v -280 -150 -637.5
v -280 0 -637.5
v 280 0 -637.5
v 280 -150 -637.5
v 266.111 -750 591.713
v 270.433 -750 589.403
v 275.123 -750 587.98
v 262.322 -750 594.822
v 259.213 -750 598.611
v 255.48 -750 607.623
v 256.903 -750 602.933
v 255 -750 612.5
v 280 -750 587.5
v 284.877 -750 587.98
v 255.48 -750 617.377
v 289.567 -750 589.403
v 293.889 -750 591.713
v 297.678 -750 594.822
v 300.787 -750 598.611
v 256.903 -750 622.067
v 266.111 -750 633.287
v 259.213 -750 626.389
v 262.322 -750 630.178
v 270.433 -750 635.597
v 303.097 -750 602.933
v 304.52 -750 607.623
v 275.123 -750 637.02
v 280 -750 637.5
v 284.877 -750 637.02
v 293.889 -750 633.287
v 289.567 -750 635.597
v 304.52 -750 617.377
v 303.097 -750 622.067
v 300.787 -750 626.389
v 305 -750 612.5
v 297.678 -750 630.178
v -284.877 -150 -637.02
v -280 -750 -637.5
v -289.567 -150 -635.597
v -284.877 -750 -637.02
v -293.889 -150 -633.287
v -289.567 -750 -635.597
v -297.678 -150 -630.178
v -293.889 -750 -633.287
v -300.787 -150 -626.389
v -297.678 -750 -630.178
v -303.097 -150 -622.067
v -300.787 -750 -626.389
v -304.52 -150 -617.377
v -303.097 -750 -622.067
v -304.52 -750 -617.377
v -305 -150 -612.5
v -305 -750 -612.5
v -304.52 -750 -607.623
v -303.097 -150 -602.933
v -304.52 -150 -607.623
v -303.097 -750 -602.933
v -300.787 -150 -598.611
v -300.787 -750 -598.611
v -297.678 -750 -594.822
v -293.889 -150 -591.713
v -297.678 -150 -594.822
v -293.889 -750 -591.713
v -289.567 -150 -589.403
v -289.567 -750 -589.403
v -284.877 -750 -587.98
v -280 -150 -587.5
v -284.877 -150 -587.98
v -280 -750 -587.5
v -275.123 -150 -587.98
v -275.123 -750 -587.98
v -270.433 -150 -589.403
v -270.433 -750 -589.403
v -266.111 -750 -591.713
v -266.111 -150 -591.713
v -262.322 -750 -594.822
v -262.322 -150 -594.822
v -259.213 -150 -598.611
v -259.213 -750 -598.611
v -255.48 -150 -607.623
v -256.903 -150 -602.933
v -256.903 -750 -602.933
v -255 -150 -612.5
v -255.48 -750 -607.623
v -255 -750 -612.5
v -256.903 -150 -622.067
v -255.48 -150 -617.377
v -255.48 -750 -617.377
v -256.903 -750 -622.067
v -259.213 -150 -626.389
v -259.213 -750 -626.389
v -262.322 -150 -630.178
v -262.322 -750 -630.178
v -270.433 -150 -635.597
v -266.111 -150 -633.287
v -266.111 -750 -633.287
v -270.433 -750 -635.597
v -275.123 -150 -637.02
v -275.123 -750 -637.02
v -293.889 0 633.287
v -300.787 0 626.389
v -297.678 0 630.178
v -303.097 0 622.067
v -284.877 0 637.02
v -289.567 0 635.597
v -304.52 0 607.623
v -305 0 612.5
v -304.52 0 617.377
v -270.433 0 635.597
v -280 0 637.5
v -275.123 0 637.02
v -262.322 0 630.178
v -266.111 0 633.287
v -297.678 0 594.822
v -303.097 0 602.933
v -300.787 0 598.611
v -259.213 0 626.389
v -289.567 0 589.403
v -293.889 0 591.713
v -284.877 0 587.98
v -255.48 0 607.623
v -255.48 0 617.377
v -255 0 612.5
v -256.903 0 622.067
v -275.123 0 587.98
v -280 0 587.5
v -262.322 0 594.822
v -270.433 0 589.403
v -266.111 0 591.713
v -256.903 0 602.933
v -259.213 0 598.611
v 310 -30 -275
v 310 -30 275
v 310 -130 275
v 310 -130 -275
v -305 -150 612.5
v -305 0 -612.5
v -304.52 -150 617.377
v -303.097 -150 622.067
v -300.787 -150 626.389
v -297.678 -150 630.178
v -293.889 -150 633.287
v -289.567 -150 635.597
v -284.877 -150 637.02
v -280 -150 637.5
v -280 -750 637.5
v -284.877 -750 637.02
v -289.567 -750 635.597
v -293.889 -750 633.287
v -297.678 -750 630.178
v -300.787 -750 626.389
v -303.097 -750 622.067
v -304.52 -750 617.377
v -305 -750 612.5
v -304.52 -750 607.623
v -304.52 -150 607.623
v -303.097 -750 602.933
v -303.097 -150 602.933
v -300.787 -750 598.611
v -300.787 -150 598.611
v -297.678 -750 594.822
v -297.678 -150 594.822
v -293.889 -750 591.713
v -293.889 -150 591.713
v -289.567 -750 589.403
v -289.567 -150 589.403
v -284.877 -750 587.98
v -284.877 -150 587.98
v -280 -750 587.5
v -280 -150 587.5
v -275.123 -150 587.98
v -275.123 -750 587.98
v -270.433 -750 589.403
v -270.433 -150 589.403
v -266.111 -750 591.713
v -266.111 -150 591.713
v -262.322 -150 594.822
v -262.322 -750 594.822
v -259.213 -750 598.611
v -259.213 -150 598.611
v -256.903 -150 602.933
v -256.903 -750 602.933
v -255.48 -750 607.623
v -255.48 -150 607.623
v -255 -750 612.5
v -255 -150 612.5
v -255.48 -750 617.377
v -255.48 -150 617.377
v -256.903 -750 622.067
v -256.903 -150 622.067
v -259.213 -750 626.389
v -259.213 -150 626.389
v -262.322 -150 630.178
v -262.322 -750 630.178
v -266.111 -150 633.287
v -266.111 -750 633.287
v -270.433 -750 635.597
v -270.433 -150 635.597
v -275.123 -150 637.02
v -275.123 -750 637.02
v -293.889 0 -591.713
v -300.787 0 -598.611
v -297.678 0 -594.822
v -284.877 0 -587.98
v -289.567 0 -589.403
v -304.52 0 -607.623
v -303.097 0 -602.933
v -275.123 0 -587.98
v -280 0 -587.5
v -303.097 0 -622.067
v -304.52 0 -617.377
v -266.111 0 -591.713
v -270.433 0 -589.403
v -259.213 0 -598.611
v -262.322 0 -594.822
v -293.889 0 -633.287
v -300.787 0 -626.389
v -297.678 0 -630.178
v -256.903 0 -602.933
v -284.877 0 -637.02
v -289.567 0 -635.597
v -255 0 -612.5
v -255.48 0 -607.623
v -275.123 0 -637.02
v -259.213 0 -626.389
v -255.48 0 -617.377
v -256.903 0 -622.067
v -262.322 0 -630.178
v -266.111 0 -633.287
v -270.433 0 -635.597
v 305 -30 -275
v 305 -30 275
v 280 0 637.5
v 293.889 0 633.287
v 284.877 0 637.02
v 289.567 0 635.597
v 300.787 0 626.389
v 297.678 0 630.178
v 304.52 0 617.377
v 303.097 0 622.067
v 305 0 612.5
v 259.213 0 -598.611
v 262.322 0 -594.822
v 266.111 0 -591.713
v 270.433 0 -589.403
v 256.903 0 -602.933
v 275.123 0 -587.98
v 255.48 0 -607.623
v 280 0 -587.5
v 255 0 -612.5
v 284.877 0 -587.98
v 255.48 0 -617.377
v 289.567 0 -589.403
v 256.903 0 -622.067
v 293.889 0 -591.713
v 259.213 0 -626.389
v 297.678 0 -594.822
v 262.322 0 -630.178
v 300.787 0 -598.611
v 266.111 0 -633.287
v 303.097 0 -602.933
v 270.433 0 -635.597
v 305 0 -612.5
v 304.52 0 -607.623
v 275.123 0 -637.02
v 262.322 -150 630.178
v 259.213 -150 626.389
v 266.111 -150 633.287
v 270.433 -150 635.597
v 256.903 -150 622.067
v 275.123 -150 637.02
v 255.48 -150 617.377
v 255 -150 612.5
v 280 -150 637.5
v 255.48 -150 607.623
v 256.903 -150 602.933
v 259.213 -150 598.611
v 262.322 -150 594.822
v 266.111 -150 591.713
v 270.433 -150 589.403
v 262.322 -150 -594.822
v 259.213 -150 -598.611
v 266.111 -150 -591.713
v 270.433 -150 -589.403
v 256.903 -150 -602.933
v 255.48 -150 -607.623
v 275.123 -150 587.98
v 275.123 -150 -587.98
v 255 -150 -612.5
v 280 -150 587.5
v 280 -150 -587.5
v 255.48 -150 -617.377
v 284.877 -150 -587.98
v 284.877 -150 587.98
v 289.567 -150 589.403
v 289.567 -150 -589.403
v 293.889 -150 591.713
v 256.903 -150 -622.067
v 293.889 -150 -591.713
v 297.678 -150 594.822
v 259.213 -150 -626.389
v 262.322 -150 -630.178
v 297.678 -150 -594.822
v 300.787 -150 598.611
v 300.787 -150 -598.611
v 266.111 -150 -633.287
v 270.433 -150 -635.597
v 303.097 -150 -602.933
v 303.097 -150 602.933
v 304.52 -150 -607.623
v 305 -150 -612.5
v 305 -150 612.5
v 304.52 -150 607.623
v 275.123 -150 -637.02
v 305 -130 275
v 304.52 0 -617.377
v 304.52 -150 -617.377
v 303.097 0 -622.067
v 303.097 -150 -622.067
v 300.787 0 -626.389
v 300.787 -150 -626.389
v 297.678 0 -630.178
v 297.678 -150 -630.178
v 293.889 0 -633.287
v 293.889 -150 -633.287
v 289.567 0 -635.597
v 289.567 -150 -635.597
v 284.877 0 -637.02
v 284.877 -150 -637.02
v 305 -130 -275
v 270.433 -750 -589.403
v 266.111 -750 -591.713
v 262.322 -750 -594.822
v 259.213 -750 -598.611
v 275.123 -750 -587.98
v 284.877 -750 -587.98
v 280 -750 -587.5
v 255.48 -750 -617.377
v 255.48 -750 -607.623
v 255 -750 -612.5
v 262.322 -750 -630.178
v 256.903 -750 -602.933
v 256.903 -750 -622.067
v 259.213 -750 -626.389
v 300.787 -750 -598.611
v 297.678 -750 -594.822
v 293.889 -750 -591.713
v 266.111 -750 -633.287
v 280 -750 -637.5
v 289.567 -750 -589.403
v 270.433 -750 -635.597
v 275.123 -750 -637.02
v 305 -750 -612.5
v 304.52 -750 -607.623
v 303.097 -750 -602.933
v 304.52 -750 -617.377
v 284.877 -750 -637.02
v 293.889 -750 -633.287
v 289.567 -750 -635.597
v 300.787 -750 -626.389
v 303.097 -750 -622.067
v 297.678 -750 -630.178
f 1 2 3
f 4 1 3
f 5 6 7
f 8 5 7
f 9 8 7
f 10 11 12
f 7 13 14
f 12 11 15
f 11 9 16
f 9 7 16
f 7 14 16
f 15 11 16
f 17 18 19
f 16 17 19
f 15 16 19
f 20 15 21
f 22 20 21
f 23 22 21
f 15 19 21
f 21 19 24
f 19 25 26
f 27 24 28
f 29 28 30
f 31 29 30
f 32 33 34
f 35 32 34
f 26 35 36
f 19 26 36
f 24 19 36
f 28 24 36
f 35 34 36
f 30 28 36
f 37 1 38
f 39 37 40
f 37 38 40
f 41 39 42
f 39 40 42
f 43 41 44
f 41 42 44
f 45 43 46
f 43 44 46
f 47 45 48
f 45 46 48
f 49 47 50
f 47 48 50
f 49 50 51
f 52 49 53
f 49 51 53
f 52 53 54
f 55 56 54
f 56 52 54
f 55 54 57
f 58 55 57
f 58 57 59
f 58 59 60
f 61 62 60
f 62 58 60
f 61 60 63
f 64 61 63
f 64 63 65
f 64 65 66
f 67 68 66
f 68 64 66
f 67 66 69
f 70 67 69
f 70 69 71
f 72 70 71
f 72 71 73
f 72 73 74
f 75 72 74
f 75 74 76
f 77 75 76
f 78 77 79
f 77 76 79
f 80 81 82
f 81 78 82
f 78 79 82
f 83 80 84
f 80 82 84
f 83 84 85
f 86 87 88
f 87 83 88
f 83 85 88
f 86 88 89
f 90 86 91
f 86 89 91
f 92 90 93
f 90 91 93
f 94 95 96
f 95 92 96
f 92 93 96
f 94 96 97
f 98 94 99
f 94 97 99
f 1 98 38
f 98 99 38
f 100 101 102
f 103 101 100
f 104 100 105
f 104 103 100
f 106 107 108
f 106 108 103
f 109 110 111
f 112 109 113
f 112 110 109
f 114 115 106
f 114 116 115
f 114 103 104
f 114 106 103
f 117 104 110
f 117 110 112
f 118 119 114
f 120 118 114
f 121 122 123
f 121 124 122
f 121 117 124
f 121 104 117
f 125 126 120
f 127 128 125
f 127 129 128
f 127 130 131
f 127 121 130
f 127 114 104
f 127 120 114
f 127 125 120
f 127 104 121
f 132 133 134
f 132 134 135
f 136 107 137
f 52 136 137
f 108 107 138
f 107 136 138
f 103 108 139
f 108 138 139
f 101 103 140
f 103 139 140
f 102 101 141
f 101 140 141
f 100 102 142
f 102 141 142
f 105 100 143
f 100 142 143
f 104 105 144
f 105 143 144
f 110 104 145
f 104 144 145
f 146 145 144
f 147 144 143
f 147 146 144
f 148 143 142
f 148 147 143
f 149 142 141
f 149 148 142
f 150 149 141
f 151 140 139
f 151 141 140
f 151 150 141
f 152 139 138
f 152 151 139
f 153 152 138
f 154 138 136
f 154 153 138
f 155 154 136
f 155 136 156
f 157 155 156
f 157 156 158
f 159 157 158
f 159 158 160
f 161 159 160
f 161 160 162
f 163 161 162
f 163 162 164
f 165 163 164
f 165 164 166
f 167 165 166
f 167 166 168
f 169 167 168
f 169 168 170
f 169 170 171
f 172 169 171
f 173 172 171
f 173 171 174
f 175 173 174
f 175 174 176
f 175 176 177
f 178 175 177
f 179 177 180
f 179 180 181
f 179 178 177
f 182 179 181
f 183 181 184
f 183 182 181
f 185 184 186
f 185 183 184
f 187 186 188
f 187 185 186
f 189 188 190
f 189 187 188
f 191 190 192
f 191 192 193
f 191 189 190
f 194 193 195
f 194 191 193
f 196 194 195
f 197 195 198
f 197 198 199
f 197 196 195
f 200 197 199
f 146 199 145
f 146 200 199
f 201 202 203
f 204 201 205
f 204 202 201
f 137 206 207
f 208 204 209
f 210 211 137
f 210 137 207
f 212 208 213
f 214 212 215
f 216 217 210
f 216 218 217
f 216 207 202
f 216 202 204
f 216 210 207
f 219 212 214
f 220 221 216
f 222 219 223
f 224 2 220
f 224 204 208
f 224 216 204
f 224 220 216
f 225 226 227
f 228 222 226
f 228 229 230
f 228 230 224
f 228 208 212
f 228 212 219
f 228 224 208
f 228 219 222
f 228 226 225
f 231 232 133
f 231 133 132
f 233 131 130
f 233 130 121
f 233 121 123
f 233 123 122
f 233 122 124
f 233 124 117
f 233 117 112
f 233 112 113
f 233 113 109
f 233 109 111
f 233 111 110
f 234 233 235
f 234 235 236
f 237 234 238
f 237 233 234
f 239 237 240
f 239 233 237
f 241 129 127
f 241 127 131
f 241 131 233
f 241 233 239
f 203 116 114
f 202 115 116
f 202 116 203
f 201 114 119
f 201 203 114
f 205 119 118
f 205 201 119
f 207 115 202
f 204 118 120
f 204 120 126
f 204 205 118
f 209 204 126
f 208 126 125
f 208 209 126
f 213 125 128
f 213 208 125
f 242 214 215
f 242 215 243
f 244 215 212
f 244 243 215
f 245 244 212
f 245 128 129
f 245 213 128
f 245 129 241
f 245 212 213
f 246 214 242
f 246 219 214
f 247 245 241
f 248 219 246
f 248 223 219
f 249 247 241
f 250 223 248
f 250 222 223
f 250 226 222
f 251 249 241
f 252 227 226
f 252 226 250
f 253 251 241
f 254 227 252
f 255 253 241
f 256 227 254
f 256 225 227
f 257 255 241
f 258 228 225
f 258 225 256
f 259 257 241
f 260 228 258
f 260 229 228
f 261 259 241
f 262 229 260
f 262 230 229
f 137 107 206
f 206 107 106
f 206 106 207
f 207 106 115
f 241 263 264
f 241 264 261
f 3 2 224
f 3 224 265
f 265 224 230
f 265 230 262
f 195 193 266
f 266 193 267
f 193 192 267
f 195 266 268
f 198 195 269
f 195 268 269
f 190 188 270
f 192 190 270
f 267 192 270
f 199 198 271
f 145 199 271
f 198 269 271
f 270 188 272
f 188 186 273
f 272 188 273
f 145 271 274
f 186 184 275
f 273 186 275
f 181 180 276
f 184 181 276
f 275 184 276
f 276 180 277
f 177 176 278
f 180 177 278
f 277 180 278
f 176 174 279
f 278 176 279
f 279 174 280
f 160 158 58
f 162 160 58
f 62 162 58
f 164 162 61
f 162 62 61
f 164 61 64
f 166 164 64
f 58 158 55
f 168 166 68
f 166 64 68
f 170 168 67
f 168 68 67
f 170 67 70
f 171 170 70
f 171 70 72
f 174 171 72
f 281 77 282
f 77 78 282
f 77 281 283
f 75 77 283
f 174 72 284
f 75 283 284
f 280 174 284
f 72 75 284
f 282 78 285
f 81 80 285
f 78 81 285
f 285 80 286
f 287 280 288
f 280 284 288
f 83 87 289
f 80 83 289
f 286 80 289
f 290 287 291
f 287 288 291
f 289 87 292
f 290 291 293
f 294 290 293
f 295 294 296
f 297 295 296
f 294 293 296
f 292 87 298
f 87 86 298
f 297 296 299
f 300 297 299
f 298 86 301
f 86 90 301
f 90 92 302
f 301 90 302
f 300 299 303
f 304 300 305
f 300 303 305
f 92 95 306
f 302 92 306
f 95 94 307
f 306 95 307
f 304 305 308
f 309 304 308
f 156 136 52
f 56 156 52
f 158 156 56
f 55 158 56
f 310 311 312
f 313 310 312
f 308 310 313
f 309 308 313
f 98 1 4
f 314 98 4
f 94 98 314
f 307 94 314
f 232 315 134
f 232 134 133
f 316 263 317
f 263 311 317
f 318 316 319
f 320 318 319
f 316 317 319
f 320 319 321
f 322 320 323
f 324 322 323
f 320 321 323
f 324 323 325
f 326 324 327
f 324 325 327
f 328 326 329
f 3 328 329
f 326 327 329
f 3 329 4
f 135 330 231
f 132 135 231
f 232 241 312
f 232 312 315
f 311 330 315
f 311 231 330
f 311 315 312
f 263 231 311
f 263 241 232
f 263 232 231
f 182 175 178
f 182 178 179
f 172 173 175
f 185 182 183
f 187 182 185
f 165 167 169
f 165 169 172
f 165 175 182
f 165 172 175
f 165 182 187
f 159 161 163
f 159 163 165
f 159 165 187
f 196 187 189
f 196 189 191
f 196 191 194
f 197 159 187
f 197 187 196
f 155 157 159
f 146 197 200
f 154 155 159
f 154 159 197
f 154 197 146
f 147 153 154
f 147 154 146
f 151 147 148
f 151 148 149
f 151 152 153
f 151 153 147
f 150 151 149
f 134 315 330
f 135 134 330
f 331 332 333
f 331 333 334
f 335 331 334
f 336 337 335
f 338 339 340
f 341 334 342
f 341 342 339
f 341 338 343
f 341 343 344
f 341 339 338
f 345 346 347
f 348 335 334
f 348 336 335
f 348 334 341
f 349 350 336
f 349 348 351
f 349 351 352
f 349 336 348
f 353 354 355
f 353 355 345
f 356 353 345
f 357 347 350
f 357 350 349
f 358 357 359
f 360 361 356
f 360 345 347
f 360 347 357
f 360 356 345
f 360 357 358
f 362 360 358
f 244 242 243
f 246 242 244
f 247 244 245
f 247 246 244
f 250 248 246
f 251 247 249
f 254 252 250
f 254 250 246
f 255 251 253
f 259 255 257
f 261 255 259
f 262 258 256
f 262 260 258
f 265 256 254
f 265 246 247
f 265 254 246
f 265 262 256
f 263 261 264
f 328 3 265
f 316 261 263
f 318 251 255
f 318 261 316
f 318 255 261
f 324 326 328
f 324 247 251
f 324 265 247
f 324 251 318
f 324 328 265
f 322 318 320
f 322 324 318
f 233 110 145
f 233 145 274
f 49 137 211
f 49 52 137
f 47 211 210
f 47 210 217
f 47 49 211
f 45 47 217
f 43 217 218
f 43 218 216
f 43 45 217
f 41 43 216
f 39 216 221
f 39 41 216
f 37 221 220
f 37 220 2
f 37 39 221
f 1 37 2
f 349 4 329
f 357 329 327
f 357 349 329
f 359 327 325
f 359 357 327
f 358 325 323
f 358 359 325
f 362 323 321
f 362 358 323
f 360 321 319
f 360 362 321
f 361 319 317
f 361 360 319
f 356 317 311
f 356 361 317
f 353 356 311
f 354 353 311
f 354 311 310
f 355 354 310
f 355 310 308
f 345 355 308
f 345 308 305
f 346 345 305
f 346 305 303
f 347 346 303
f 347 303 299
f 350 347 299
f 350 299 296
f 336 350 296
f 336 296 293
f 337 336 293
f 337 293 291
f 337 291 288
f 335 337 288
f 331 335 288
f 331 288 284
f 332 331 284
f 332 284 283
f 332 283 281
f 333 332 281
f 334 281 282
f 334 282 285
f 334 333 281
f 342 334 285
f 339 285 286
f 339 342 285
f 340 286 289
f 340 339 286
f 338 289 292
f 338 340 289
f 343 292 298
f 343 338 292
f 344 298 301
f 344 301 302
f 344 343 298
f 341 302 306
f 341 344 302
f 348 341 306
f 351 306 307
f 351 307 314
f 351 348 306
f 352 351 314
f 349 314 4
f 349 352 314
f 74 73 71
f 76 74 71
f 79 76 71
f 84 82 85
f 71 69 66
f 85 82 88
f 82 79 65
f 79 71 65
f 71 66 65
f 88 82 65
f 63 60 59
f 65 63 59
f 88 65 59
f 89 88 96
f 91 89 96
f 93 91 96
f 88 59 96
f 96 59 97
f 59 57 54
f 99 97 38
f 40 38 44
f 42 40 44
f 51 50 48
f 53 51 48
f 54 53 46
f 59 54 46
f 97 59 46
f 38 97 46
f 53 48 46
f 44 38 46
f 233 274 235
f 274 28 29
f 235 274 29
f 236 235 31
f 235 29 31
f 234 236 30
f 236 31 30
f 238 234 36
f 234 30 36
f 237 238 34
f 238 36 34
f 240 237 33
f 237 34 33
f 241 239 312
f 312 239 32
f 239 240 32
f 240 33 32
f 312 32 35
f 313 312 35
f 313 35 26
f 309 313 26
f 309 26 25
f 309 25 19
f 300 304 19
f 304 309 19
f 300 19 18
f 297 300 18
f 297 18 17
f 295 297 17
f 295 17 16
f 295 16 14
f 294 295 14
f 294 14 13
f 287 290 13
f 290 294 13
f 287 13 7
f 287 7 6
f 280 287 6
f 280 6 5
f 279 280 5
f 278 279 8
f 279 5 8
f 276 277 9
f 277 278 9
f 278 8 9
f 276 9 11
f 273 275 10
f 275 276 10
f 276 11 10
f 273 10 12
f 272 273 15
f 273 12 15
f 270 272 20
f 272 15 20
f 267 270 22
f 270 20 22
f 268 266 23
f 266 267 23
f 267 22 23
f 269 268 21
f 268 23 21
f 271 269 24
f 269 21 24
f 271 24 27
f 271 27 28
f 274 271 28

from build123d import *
from build123d.topology import SkipClean

# Parameters (mm, degrees)
SKETCH_2_W               = 610
SKETCH_2_H               = 1275
EXTRUDE_1_DEPTH          = 150
FILLET_1_R               = 25
EXTRUDE_START            = -750
SKETCH_3_R               = 25
EXTRUDE_2_DEPTH          = 750
MIRROR_START             = -750
MIRROR_2_COPY_1_SKETCH_R = 25
MIRROR_2_COPY_1_DEPTH    = 750
SKETCH_4_W               = 550
SKETCH_4_H               = 100
EXTRUDE_3_DEPTH          = 5


with BuildPart() as part:
    # 草图2 → 凸台-拉伸1 (new body)
    with BuildSketch(Plane(origin=(0, 0, 0), x_dir=(1, 0, 0), z_dir=(0, 1, 0))):
        Rectangle(SKETCH_2_W, SKETCH_2_H)
    extrude(amount=-EXTRUDE_1_DEPTH)

    # 圆角1
    fillet_1_edges = [part.edges().sort_by_distance(p)[0] for p in [
        (-305, -75, -637.5),
        (305, -75, -637.5),
        (-305, -75, 637.5),
        (305, -75, 637.5),
    ]]
    fillet(fillet_1_edges, radius=FILLET_1_R)

    # 草图3 → 凸台-拉伸2 (add)
    with SkipClean():  # the faces are left unmerged after this step: merging them gives an invalid solid
        with BuildSketch(Plane(origin=(0, 0, 0), x_dir=(1, 0, 0), z_dir=(0, 1, 0)).offset(EXTRUDE_START)):
            with Locations((280, -612.5)):
                Circle(SKETCH_3_R)
        extrude_2 = extrude(amount=EXTRUDE_2_DEPTH)

    # 镜向1: 凸台-拉伸2 across plane
    with SkipClean():  # the faces are left unmerged after this step: merging them gives an invalid solid
        add(extrude_2.mirror(Plane(origin=(0, 0, 0), x_dir=(0, 0, 1), z_dir=(1, 0, 0))))

    # 镜向2: 凸台-拉伸2 across plane
    with SkipClean():  # the faces are left unmerged after this step: merging them gives an invalid solid
        add(extrude_2.mirror(Plane.XY))

    # 镜向2 copy 1 sketch → 镜向2 copy 1 (add)
    with SkipClean():  # the faces are left unmerged after this step: merging them gives an invalid solid
        with BuildSketch(Plane(origin=(0, 0, 0), x_dir=(-1, 0, 0), z_dir=(0, 1, 0)).offset(MIRROR_START)):
            with Locations((280, -612.5)):
                Circle(MIRROR_2_COPY_1_SKETCH_R)
        extrude(amount=MIRROR_2_COPY_1_DEPTH)

    # 草图4 → 凸台-拉伸3 (add)
    with SkipClean():  # the faces are left unmerged after this step: merging them gives an invalid solid
        with BuildSketch(Plane(origin=(305, 0, 0), x_dir=(0, 0, -1), z_dir=(1, 0, 0))):
            with Locations((0, -80)):
                Rectangle(SKETCH_4_W, SKETCH_4_H)
        extrude(amount=EXTRUDE_3_DEPTH)


solid = part.part
